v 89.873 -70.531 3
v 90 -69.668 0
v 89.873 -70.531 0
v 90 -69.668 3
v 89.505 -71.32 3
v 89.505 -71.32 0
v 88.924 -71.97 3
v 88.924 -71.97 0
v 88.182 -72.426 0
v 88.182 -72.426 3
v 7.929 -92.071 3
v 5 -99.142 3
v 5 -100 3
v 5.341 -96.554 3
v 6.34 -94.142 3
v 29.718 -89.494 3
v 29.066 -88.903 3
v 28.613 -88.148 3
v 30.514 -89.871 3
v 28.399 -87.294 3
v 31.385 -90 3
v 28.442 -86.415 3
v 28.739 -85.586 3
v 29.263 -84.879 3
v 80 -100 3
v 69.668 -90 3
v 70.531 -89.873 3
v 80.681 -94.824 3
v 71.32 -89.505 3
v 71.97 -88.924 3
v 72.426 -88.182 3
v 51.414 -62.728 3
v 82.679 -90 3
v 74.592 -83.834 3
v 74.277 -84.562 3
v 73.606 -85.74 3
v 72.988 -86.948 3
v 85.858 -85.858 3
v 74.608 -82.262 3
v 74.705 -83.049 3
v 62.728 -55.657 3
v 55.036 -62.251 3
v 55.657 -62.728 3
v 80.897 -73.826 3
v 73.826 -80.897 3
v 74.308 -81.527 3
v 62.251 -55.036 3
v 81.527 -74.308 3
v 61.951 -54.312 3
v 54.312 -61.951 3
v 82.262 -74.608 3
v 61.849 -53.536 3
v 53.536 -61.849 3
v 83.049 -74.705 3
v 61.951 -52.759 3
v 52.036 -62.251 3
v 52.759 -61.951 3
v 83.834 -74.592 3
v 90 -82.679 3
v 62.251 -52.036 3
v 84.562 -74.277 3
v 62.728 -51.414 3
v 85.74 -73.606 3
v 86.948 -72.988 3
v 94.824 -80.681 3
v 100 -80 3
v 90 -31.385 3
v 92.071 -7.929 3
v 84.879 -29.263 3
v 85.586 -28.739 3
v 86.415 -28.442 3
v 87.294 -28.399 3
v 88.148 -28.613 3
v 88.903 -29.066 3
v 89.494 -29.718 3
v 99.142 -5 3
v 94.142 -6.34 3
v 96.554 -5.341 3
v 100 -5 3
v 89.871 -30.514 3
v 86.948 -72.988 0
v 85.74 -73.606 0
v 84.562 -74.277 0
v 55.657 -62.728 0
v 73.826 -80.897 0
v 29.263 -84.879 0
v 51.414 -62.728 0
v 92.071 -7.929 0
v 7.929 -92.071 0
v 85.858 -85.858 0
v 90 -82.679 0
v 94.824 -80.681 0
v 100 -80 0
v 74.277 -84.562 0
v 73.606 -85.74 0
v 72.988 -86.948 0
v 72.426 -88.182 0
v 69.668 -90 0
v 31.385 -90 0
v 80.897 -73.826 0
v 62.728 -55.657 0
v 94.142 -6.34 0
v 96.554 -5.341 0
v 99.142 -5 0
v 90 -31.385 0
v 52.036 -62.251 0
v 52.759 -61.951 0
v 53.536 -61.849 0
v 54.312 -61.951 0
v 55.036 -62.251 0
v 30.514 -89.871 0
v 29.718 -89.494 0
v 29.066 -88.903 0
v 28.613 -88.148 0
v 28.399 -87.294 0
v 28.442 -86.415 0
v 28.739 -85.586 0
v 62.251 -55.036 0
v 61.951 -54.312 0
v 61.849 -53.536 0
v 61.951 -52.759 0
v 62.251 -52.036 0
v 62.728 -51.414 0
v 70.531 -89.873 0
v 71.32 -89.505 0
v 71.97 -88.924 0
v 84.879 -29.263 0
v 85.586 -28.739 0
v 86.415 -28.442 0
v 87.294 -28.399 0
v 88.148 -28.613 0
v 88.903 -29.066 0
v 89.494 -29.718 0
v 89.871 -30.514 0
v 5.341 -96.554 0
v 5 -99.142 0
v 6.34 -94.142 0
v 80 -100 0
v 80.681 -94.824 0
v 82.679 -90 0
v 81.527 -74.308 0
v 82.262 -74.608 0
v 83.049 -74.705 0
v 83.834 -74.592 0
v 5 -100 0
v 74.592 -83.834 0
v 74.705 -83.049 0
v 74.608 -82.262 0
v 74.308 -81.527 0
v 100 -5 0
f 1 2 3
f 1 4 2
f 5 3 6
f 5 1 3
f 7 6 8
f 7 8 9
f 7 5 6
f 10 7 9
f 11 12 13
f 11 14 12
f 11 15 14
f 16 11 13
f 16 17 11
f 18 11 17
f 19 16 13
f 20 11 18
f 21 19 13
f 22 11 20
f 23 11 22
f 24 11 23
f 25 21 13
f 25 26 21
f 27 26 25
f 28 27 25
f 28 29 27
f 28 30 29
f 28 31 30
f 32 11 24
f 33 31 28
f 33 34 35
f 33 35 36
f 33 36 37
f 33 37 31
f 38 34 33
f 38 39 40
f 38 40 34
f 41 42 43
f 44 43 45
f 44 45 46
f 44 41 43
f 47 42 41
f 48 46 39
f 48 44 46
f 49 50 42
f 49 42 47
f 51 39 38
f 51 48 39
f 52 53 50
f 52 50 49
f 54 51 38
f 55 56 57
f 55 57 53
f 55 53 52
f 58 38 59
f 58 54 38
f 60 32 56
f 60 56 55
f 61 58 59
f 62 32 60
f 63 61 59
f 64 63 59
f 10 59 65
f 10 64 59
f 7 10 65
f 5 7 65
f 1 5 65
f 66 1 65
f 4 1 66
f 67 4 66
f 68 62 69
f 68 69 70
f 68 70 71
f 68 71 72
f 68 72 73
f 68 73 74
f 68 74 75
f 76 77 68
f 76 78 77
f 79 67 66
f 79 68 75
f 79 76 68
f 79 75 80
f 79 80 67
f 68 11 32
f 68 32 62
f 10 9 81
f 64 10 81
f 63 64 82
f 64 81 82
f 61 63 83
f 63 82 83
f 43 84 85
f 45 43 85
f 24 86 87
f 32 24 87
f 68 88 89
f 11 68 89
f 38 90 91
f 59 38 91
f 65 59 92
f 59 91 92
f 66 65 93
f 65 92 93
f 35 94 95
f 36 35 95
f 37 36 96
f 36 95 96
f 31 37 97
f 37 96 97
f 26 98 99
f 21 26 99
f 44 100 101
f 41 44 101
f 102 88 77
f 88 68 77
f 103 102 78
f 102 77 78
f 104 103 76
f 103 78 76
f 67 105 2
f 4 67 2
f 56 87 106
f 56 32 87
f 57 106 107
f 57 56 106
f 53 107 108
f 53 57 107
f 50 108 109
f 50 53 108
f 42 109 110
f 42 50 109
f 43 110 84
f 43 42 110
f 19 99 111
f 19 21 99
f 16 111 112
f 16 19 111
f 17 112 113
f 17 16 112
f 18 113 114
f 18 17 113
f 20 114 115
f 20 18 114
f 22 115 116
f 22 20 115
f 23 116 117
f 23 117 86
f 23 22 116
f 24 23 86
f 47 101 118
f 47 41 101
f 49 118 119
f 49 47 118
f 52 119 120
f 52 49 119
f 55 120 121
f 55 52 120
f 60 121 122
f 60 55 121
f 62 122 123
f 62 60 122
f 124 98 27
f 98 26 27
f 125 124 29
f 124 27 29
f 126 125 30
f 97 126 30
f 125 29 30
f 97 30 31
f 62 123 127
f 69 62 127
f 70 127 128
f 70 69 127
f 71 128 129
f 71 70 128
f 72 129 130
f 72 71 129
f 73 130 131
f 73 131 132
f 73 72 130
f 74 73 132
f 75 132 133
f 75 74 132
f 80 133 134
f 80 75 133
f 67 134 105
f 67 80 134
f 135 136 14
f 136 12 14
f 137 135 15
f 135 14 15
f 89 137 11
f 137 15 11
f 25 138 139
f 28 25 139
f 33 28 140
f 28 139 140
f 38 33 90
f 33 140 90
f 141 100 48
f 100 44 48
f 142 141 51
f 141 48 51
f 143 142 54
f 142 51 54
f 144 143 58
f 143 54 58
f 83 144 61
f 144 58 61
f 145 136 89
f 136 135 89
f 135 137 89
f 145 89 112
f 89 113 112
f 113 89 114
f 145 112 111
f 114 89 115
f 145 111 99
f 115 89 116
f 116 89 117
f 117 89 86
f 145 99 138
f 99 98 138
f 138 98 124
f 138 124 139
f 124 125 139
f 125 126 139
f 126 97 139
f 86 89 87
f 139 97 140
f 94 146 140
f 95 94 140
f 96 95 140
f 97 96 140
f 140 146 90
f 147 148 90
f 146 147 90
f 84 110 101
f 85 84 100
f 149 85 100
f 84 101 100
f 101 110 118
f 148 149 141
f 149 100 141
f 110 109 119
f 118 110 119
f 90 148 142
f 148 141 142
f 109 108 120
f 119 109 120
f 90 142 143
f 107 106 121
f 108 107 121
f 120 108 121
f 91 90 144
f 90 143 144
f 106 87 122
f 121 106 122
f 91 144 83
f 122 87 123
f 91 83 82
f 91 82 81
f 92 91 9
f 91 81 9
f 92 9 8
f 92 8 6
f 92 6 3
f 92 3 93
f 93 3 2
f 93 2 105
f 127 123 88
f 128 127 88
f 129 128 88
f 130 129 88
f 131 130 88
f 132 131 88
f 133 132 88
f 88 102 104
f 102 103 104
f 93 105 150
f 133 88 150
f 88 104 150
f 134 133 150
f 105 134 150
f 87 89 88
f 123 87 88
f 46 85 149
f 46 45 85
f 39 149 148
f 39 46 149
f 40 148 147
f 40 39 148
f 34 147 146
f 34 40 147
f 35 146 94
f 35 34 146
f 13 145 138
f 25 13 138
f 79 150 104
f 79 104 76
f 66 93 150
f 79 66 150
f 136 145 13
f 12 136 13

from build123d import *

# Parameters (mm, degrees)
F1_DEPTH = 3
F2_R     = 3
F3_W     = 5
F3_H     = 3
F4_DEPTH = 25
F5_W     = 5
F5_H     = 3
F6_DEPTH = 25
F7_R     = 10


with BuildPart() as f1:
    # F0 (on Top) → F1 (new body)
    with BuildSketch(Plane.XY):
        with BuildLine():
            Line((50, -50), (0, -100))
            Line((0, -100), (70, -100))
            ThreePointArc((70, -100), (70.4320432104, -94.9269406382), (71.7157287525, -90))
            Line((71.7157287525, -90), (24.1421356237, -90))
            Line((24.1421356237, -90), (53.5355339059, -60.6066017178))
            Line((53.5355339059, -60.6066017178), (75.5479654307, -82.6190332426))
            ThreePointArc((75.5479654307, -82.6190332426), (77.0871215252, -80.635083269), (78.7867965644, -78.7867965644))
            Line((78.7867965644, -78.7867965644), (50, -50))
        make_face()
        with BuildLine():
            ThreePointArc((71.7157287525, -90), (70.4320432104, -94.9269406382), (70, -100))
            Line((70, -100), (80, -100))
            ThreePointArc((80, -100), (81.5224093498, -92.3463313527), (85.8578643763, -85.8578643763))
            Line((85.8578643763, -85.8578643763), (78.7867965644, -78.7867965644))
            ThreePointArc((78.7867965644, -78.7867965644), (77.0871215252, -80.635083269), (75.5479654307, -82.6190332426))
            ThreePointArc((75.5479654307, -82.6190332426), (73.3748398058, -86.1760770896), (71.7157287525, -90))
        make_face()
        with BuildLine():
            Line((100, -70), (100, 0))
            Line((100, 0), (50, -50))
            Line((50, -50), (78.7867965644, -78.7867965644))
            ThreePointArc((78.7867965644, -78.7867965644), (80.635083269, -77.0871215252), (82.6190332426, -75.5479654307))
            Line((82.6190332426, -75.5479654307), (60.6066017178, -53.5355339059))
            Line((60.6066017178, -53.5355339059), (90, -24.1421356237))
            Line((90, -24.1421356237), (90, -71.7157287525))
            ThreePointArc((90, -71.7157287525), (94.9269406382, -70.4320432104), (100, -70))
        make_face()
        with BuildLine():
            Line((100, -80), (100, -70))
            ThreePointArc((100, -70), (94.9269406382, -70.4320432104), (90, -71.7157287525))
            ThreePointArc((90, -71.7157287525), (86.1760770896, -73.3748398058), (82.6190332426, -75.5479654307))
            ThreePointArc((82.6190332426, -75.5479654307), (80.635083269, -77.0871215252), (78.7867965644, -78.7867965644))
            Line((78.7867965644, -78.7867965644), (85.8578643763, -85.8578643763))
            ThreePointArc((85.8578643763, -85.8578643763), (92.3463313527, -81.5224093498), (100, -80))
        make_face()
    extrude(amount=F1_DEPTH)

    # F2
    f2_edges = [f1.edges().sort_by_distance(p)[0] for p in [
        (24.142136, -90, 1.5),
        (53.535534, -60.606602, 1.5),
        (71.715729, -90, 1.5),
        (75.547965, -82.619033, 1.5),
        (60.606602, -53.535534, 1.5),
        (90, -71.715729, 1.5),
        (82.619033, -75.547965, 1.5),
        (90, -24.142136, 1.5),
    ]]
    fillet(f2_edges, radius=F2_R)

    # F3 (on face) → F4 (cut)
    with BuildSketch(Plane.XZ.offset(100)):
        with Locations((2.5, 1.5)):
            Rectangle(F3_W, F3_H)
    extrude(amount=-F4_DEPTH, mode=Mode.SUBTRACT)

    # F5 (on face) → F6 (cut)
    with BuildSketch(Plane.YZ.offset(100)):
        with Locations((-2.5, 1.5)):
            Rectangle(F5_W, F5_H)
    extrude(amount=-F6_DEPTH, mode=Mode.SUBTRACT)

    # F7
    f7_edges = [f1.edges().sort_by_distance(p)[0] for p in [
        (5, -95, 1.5),
        (95, -5, 1.5),
    ]]
    fillet(f7_edges, radius=F7_R)


solid = f1.part
